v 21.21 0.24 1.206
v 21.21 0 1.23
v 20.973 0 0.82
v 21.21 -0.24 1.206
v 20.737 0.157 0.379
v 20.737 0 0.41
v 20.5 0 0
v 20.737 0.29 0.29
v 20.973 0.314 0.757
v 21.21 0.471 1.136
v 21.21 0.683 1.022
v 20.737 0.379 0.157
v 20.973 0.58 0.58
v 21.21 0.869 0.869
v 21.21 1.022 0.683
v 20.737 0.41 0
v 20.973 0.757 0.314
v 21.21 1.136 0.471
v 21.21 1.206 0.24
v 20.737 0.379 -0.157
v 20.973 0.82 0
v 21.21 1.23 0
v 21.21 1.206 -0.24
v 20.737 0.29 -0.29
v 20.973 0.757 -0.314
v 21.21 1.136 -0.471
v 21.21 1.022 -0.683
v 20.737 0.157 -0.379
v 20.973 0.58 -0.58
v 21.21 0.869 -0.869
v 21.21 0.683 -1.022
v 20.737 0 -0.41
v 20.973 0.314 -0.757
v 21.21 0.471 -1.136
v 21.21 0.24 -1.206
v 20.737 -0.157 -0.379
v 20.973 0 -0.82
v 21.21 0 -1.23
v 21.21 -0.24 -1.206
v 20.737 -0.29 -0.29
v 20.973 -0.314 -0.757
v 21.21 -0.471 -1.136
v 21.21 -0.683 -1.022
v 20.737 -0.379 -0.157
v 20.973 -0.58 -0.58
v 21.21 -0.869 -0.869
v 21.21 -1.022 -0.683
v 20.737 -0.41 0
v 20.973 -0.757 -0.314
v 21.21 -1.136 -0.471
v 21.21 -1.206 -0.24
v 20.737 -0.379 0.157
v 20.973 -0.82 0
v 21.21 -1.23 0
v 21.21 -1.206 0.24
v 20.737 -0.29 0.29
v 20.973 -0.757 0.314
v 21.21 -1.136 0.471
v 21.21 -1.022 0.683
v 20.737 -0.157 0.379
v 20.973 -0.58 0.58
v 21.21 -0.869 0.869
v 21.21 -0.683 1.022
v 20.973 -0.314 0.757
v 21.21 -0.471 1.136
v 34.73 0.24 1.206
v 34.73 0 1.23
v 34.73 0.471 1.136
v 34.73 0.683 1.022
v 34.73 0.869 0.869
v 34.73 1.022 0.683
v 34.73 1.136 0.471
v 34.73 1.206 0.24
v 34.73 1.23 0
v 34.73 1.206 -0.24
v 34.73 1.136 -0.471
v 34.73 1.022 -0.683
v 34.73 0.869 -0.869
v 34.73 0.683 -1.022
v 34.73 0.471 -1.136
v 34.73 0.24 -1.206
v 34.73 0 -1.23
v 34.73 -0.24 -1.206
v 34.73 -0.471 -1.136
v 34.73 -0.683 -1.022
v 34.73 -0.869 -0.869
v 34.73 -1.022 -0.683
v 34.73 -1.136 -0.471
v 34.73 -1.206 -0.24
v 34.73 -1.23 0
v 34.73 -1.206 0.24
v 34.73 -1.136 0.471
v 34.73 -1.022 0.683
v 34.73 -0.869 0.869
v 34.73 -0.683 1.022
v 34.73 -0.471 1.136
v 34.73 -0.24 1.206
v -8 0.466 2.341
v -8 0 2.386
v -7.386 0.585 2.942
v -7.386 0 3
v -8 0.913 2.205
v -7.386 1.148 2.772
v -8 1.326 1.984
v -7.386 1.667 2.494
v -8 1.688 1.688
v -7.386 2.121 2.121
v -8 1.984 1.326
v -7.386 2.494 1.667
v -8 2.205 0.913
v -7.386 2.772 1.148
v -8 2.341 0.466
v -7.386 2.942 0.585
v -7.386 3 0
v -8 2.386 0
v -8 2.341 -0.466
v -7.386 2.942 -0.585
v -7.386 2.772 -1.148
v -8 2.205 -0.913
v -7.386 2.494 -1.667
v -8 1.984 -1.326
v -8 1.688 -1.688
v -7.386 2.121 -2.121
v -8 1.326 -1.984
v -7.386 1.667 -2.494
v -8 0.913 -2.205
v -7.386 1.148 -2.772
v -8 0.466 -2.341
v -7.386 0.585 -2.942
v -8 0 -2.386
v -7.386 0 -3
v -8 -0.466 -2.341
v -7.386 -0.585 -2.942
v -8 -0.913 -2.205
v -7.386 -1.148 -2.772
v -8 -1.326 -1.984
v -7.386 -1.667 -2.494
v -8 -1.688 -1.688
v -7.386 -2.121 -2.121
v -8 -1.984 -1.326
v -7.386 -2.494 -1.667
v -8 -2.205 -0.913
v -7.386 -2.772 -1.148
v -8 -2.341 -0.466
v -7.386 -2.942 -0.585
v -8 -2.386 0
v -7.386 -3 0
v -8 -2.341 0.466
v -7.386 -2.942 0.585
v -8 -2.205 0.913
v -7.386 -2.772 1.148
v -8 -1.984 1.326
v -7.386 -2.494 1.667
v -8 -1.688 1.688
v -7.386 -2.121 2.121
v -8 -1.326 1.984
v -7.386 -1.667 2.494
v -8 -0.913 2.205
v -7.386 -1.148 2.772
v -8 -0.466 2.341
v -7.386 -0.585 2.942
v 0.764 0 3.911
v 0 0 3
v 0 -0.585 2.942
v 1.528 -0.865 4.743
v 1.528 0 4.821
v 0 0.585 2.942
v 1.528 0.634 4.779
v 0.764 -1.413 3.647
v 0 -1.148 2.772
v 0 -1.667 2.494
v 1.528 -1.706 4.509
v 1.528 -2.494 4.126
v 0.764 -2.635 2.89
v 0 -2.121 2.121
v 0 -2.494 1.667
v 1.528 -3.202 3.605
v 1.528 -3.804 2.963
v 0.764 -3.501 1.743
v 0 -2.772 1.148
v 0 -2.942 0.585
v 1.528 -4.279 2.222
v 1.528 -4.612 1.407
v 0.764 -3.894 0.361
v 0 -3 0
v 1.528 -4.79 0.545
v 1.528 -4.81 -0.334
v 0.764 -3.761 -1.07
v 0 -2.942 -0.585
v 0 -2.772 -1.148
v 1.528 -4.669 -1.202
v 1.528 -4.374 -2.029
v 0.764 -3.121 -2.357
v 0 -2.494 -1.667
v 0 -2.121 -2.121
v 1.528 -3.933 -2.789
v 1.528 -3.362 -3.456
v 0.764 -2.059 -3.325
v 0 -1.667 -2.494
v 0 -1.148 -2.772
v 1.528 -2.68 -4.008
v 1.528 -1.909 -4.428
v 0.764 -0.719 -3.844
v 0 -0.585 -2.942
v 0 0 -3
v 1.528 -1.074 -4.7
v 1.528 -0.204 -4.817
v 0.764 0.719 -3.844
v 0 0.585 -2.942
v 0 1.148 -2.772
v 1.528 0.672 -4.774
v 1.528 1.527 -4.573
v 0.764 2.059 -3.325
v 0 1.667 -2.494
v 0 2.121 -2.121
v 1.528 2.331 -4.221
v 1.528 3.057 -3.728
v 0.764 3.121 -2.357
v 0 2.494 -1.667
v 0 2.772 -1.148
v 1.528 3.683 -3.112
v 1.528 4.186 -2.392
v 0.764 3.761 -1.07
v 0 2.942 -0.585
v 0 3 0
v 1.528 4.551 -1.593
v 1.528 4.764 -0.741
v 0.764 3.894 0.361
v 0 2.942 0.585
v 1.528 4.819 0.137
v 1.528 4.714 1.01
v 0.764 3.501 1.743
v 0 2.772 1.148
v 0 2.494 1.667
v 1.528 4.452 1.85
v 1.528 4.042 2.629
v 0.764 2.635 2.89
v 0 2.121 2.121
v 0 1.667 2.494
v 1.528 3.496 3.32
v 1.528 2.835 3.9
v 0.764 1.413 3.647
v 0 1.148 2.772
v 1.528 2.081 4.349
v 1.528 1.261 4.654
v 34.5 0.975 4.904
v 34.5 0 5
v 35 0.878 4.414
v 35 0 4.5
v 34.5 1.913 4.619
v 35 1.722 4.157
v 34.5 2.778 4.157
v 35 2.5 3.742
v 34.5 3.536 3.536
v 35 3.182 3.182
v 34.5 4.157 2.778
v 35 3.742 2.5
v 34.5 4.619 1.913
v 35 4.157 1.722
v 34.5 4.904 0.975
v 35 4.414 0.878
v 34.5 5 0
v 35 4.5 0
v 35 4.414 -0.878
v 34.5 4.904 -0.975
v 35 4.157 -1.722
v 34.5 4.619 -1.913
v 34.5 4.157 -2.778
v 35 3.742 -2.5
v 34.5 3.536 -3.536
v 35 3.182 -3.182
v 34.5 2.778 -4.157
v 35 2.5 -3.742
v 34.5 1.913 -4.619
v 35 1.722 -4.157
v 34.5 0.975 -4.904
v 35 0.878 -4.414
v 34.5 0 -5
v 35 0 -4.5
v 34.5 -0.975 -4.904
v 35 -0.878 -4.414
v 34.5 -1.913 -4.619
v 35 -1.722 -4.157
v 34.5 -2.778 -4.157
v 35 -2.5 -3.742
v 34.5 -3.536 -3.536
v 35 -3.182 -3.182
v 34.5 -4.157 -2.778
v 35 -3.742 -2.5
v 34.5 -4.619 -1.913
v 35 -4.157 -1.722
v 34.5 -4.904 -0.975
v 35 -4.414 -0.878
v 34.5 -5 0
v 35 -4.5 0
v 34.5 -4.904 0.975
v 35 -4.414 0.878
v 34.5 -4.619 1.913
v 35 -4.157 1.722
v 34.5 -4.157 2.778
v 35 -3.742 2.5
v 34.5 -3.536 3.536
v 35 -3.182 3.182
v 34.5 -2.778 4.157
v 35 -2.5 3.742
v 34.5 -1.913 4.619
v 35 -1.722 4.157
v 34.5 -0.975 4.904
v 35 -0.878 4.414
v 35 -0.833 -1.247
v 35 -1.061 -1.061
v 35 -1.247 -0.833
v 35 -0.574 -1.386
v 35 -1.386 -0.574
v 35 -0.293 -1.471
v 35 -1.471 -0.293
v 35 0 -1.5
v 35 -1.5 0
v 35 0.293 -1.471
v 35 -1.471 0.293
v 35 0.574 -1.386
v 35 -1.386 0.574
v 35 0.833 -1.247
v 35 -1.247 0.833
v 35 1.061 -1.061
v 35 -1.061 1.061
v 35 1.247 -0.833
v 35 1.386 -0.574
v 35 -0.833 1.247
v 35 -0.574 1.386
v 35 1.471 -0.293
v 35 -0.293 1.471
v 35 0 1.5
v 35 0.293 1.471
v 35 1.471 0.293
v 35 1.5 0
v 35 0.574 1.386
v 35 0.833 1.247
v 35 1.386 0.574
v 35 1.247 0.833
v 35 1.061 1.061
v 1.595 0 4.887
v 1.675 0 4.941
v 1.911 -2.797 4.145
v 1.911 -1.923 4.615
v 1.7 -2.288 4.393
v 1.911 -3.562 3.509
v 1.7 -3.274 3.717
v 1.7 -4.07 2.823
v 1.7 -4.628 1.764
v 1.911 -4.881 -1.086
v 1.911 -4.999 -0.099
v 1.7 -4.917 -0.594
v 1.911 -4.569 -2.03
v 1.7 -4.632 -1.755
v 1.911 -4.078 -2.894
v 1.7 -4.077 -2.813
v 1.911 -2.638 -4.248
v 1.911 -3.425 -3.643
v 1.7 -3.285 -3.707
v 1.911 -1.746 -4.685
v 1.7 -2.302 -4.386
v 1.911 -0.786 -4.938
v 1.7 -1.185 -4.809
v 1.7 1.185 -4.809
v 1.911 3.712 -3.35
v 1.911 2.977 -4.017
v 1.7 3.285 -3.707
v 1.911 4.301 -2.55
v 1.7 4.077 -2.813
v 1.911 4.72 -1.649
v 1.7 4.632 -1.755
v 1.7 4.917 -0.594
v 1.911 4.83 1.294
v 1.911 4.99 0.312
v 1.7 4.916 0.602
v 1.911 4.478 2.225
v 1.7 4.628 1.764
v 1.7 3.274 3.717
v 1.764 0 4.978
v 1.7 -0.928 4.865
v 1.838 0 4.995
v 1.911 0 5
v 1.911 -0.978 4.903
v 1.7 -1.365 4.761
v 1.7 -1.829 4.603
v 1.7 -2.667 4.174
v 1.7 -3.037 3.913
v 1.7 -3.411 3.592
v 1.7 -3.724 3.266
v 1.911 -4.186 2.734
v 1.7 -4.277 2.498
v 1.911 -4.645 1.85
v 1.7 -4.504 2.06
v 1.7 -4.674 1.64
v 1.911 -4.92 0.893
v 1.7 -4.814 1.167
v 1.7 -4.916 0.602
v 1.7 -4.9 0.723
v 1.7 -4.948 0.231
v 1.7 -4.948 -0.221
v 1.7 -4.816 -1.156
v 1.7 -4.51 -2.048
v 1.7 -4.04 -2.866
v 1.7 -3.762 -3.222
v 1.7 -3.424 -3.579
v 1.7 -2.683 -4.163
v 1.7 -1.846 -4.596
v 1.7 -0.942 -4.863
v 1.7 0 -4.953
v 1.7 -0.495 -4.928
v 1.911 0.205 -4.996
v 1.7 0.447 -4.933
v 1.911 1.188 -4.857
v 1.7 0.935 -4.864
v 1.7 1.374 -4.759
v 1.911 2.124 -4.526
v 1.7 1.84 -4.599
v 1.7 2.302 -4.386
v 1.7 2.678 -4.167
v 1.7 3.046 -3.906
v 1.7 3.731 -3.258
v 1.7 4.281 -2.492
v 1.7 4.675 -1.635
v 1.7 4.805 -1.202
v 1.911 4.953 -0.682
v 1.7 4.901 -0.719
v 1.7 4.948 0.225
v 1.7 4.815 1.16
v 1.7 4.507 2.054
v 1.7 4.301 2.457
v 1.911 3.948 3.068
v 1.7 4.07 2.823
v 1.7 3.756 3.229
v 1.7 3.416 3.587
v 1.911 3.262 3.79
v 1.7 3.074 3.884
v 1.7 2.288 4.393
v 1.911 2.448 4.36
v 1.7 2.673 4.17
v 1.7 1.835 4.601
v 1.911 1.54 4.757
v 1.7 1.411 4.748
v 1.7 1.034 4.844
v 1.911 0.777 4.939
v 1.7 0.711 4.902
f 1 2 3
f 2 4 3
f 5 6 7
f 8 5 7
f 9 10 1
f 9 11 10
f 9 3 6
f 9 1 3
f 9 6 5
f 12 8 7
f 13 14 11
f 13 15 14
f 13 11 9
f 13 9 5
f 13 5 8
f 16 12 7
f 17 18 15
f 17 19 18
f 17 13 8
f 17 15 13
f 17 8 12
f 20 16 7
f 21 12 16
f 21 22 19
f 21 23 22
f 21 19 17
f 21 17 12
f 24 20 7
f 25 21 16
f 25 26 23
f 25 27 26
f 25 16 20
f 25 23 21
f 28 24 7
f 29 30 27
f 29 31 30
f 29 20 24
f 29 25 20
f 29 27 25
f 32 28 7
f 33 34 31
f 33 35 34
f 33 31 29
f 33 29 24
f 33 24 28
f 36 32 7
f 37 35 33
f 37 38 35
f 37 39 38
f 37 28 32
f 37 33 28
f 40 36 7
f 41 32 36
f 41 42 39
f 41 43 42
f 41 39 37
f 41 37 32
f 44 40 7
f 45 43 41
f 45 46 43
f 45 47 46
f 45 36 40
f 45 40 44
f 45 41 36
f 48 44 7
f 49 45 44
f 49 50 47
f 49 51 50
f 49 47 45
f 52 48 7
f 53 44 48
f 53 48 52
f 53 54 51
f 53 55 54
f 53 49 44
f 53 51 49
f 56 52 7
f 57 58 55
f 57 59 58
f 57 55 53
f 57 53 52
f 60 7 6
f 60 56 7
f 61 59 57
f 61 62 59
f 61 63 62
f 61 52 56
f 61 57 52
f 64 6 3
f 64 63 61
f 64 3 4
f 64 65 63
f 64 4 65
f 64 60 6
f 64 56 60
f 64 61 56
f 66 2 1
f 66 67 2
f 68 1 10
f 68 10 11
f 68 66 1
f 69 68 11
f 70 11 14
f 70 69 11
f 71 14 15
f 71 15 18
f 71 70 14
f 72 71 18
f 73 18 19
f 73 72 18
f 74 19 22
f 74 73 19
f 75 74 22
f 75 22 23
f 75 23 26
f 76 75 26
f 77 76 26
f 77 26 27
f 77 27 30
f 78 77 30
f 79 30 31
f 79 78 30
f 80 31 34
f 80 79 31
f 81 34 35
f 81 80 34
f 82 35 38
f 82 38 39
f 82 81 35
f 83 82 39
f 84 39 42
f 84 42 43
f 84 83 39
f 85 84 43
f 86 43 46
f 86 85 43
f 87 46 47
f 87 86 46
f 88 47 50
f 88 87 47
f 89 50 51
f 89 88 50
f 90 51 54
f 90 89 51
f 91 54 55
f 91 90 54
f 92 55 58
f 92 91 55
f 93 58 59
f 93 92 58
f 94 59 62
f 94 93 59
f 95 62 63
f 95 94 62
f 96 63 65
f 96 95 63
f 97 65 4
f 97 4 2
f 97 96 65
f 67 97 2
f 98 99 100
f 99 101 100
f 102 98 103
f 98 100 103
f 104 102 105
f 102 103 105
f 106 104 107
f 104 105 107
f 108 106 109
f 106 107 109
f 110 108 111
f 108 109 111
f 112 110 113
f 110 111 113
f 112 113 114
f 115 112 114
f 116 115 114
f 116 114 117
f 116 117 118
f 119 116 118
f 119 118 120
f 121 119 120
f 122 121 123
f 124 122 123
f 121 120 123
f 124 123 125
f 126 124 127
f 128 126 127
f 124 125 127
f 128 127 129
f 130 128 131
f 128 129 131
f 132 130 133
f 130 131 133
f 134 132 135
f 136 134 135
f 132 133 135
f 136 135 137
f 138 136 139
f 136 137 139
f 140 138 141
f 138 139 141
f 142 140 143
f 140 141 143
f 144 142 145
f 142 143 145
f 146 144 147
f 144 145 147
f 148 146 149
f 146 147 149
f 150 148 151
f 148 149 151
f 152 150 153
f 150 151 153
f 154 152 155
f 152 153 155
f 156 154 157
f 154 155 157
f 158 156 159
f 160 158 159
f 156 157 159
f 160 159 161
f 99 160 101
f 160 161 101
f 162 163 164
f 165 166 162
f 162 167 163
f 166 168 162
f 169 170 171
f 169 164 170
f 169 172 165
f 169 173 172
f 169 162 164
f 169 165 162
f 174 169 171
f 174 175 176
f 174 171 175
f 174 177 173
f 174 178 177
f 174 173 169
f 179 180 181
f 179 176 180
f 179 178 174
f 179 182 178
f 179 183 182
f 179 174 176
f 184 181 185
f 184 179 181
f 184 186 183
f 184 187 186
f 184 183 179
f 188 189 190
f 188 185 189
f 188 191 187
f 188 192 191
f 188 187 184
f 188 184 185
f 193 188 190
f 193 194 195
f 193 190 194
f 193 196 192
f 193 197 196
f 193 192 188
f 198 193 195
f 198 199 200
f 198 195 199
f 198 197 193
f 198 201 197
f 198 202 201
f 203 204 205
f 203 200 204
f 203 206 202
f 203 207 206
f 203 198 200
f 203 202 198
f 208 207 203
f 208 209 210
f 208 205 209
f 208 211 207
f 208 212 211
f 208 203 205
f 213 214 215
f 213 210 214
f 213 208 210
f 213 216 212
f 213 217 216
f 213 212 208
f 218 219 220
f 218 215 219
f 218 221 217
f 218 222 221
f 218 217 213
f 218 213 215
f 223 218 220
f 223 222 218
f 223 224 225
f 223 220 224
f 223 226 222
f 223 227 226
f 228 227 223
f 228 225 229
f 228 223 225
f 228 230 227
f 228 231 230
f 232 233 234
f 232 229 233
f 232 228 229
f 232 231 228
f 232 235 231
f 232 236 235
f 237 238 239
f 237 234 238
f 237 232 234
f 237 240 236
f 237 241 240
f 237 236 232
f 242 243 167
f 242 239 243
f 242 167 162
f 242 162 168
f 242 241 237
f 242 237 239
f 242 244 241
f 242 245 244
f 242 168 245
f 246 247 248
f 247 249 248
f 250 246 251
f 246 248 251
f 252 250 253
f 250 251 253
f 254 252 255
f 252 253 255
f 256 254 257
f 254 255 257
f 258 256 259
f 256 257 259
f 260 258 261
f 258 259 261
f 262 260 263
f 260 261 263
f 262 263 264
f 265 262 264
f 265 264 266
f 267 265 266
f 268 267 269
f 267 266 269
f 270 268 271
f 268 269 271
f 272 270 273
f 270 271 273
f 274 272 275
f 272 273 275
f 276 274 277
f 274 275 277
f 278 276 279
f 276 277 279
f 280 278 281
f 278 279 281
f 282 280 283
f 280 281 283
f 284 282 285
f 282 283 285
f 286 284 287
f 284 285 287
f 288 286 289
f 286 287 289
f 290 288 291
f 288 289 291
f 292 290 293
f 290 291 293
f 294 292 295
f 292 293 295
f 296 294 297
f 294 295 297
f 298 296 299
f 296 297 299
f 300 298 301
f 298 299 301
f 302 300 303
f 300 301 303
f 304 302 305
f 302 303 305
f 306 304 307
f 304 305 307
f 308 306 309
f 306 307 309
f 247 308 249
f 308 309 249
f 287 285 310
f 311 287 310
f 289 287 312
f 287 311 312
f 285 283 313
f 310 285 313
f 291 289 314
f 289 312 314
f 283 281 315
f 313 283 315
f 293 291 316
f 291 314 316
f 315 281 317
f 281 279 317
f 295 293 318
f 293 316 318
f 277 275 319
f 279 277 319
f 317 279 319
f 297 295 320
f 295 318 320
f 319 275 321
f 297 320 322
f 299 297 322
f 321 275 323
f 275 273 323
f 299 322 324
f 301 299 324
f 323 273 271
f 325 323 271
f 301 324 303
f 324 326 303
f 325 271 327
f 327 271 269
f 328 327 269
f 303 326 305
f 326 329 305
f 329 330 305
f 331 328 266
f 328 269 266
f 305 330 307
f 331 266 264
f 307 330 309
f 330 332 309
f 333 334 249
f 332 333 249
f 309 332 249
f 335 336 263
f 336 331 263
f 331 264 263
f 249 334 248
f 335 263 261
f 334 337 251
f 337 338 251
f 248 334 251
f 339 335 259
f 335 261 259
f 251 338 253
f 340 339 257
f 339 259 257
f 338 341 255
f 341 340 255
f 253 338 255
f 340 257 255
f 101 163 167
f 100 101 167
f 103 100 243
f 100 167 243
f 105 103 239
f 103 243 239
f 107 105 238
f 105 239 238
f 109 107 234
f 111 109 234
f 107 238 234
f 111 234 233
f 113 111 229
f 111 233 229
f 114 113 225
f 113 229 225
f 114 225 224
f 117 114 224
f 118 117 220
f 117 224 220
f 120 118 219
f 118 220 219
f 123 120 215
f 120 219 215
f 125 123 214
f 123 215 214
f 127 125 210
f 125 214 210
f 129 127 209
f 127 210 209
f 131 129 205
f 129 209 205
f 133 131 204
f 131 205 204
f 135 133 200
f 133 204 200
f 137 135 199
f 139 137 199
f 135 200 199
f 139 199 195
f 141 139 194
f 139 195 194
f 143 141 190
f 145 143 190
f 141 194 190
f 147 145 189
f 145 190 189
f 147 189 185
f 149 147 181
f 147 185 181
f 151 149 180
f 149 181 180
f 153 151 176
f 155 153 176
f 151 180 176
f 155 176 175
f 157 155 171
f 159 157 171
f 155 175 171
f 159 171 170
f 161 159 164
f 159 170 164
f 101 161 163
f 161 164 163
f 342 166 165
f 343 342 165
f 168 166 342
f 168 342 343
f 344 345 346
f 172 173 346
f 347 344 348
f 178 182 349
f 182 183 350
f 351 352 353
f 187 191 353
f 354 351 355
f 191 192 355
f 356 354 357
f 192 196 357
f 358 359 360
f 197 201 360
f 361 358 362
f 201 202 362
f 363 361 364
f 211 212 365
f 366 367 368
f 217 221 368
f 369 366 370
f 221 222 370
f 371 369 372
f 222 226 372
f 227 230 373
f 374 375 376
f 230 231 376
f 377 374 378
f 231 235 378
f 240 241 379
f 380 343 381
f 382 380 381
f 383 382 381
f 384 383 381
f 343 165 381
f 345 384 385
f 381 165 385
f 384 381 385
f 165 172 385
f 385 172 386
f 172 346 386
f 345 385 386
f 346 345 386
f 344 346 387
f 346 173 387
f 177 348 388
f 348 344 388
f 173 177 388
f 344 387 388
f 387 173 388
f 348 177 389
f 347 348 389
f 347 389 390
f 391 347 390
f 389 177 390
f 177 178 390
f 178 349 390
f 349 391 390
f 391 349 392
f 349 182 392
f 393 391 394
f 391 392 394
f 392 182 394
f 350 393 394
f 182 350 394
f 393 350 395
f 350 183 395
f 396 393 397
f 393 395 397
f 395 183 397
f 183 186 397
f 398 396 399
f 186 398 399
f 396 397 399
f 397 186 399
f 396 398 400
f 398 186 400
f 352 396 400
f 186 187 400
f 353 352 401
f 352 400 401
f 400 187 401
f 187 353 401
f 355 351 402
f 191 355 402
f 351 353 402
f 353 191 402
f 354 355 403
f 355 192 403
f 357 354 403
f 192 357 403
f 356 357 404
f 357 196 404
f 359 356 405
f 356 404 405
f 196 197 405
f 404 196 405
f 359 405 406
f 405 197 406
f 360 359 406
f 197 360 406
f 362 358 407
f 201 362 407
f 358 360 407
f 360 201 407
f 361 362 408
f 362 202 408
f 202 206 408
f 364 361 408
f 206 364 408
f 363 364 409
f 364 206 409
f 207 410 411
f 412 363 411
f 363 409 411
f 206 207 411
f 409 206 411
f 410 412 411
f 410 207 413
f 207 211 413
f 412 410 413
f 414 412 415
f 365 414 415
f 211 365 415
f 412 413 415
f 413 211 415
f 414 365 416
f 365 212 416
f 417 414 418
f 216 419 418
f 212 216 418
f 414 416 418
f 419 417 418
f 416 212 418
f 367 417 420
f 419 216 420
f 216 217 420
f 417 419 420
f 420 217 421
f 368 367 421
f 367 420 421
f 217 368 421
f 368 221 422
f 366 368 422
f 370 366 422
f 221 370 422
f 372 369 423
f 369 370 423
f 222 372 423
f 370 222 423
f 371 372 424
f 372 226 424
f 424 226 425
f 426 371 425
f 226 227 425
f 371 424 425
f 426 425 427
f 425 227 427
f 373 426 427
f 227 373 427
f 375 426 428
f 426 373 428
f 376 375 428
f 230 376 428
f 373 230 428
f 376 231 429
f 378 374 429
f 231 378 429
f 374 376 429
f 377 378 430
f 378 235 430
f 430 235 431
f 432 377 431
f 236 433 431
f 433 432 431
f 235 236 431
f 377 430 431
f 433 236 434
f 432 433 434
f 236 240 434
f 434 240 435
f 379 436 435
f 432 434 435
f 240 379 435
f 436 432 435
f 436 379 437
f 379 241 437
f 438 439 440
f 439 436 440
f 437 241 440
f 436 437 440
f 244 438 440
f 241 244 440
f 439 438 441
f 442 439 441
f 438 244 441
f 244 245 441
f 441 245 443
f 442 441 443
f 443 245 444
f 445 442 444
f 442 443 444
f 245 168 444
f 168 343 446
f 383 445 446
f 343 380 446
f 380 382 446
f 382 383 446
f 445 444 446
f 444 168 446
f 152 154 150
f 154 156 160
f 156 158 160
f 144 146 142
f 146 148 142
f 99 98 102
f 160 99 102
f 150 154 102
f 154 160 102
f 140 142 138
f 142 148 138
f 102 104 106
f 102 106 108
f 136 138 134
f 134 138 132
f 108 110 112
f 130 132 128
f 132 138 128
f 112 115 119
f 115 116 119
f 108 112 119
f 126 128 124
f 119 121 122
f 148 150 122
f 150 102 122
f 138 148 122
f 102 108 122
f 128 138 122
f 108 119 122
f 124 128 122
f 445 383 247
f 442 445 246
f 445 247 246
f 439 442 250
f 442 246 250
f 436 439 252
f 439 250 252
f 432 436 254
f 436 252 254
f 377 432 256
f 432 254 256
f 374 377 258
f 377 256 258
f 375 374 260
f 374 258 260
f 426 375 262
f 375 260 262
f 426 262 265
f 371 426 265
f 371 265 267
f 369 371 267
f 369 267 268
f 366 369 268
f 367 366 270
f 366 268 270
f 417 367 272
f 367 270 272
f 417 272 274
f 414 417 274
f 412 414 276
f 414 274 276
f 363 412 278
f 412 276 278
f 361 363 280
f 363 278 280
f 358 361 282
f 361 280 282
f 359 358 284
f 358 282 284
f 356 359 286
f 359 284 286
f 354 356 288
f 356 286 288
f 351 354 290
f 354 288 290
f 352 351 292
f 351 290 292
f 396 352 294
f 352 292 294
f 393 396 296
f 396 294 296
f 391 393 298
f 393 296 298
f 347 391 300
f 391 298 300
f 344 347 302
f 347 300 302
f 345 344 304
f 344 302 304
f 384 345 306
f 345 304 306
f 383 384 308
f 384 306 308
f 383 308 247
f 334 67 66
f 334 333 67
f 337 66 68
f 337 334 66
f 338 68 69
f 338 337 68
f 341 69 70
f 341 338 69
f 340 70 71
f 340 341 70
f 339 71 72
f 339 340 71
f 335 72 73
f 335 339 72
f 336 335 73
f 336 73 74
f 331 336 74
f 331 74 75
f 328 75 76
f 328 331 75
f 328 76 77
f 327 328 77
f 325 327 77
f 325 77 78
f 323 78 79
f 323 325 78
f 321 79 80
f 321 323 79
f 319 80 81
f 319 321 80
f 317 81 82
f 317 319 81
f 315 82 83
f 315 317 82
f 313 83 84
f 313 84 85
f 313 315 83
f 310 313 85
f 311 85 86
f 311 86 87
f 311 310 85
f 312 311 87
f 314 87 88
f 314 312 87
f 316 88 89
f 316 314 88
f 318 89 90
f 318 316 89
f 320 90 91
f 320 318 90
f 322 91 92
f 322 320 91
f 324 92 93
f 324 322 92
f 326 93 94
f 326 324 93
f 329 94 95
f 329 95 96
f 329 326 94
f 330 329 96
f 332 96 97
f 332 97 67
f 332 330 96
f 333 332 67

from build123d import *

# Parameters (mm, degrees)
FILLET1_R = 0.5


with BuildPart() as part:
    # Sketch1 → Revolve1 (revolve)
    with BuildSketch(Plane.XY, mode=Mode.PRIVATE) as revolve1_sk:
        Polygon((0, 0), (0, 4.5), (0.5, 5), (34.5, 5), (35, 4.5), (35, 0), align=None)
    revolve(revolve1_sk.sketch.rotate(Axis((35, 0, 0), (-1, 0, 0)), 270), axis=Axis((35, 0, 0), (-1, 0, 0)))

    # Sketch2 → Revolve2 (revolve)
    with BuildSketch(Plane.XY, mode=Mode.PRIVATE) as revolve2_sk:
        Polygon((-8, 0), (-8, 2.3865), (-7.3865, 3), (0, 3), (0, 0), align=None)
    revolve(revolve2_sk.sketch.rotate(Axis((0, 0, 0), (-1, 0, 0)), 270), axis=Axis((0, 0, 0), (-1, 0, 0)))

    # Sketch3 → Cut-Revolve1 (revolve, cut)
    with BuildSketch(Plane.XY, mode=Mode.PRIVATE) as cut_revolve1_sk:
        Polygon((20.5, 0), (21.209852156, 1.2295), (34.7295, 1.2295), (35, 1.5), (35, 0), align=None)
    revolve(cut_revolve1_sk.sketch.rotate(Axis((35, 0, 0), (-1, 0, 0)), 270), axis=Axis((35, 0, 0), (-1, 0, 0)), mode=Mode.SUBTRACT)

    # Sketch5 → Cut-Revolve2 (revolve, cut)
    with BuildSketch(Plane(origin=(0, 0, 0), x_dir=(1, 0, 0), z_dir=(0, 1, 0)), mode=Mode.PRIVATE) as cut_revolve2_sk:
        Polygon((0, 3), (1.678199262, 5), (0, 5), align=None)
    revolve(cut_revolve2_sk.sketch.rotate(Axis((0, 0, 0), (1, 0, 0)), 180), axis=Axis((0, 0, 0), (1, 0, 0)), mode=Mode.SUBTRACT)

    # Fillet1
    fillet1_edges = [part.edges().sort_by_distance(p)[0] for p in [
        (1.678199262, 0, -5),
    ]]
    fillet(fillet1_edges, radius=FILLET1_R)


solid = part.part
